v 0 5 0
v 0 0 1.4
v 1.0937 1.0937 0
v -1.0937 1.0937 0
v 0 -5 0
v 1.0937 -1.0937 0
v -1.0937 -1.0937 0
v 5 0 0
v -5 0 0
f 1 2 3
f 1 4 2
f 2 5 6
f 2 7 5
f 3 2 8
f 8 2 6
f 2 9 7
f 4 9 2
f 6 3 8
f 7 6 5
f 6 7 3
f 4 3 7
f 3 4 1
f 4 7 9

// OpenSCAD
$fn = 150;

difference() {
	union() {
		rotate(a = [-90, 0, 0]) {
			cylinder($fn = 4, h = 5.0, r1 = 1.4000000000000001, r2 = 0);
		}
		rotate(a = [90, 0, 0]) {
			cylinder($fn = 4, h = 5.0, r1 = 1.4000000000000001, r2 = 0);
		}
		rotate(a = [90, 0, 90]) {
			cylinder($fn = 4, h = 5.0, r1 = 1.4000000000000001, r2 = 0);
		}
		rotate(a = [90, 0, -90]) {
			cylinder($fn = 4, h = 5.0, r1 = 1.4000000000000001, r2 = 0);
		}
	}
	translate(v = [0, -5.0, 0]) {
		translate(v = [-5.0, 0, 0]) {
			translate(v = [0, 0, -1.4000000000000001]) {
				cube(size = [10.0, 10.0, 1.4000000000000001]);
			}
		}
	}
}
